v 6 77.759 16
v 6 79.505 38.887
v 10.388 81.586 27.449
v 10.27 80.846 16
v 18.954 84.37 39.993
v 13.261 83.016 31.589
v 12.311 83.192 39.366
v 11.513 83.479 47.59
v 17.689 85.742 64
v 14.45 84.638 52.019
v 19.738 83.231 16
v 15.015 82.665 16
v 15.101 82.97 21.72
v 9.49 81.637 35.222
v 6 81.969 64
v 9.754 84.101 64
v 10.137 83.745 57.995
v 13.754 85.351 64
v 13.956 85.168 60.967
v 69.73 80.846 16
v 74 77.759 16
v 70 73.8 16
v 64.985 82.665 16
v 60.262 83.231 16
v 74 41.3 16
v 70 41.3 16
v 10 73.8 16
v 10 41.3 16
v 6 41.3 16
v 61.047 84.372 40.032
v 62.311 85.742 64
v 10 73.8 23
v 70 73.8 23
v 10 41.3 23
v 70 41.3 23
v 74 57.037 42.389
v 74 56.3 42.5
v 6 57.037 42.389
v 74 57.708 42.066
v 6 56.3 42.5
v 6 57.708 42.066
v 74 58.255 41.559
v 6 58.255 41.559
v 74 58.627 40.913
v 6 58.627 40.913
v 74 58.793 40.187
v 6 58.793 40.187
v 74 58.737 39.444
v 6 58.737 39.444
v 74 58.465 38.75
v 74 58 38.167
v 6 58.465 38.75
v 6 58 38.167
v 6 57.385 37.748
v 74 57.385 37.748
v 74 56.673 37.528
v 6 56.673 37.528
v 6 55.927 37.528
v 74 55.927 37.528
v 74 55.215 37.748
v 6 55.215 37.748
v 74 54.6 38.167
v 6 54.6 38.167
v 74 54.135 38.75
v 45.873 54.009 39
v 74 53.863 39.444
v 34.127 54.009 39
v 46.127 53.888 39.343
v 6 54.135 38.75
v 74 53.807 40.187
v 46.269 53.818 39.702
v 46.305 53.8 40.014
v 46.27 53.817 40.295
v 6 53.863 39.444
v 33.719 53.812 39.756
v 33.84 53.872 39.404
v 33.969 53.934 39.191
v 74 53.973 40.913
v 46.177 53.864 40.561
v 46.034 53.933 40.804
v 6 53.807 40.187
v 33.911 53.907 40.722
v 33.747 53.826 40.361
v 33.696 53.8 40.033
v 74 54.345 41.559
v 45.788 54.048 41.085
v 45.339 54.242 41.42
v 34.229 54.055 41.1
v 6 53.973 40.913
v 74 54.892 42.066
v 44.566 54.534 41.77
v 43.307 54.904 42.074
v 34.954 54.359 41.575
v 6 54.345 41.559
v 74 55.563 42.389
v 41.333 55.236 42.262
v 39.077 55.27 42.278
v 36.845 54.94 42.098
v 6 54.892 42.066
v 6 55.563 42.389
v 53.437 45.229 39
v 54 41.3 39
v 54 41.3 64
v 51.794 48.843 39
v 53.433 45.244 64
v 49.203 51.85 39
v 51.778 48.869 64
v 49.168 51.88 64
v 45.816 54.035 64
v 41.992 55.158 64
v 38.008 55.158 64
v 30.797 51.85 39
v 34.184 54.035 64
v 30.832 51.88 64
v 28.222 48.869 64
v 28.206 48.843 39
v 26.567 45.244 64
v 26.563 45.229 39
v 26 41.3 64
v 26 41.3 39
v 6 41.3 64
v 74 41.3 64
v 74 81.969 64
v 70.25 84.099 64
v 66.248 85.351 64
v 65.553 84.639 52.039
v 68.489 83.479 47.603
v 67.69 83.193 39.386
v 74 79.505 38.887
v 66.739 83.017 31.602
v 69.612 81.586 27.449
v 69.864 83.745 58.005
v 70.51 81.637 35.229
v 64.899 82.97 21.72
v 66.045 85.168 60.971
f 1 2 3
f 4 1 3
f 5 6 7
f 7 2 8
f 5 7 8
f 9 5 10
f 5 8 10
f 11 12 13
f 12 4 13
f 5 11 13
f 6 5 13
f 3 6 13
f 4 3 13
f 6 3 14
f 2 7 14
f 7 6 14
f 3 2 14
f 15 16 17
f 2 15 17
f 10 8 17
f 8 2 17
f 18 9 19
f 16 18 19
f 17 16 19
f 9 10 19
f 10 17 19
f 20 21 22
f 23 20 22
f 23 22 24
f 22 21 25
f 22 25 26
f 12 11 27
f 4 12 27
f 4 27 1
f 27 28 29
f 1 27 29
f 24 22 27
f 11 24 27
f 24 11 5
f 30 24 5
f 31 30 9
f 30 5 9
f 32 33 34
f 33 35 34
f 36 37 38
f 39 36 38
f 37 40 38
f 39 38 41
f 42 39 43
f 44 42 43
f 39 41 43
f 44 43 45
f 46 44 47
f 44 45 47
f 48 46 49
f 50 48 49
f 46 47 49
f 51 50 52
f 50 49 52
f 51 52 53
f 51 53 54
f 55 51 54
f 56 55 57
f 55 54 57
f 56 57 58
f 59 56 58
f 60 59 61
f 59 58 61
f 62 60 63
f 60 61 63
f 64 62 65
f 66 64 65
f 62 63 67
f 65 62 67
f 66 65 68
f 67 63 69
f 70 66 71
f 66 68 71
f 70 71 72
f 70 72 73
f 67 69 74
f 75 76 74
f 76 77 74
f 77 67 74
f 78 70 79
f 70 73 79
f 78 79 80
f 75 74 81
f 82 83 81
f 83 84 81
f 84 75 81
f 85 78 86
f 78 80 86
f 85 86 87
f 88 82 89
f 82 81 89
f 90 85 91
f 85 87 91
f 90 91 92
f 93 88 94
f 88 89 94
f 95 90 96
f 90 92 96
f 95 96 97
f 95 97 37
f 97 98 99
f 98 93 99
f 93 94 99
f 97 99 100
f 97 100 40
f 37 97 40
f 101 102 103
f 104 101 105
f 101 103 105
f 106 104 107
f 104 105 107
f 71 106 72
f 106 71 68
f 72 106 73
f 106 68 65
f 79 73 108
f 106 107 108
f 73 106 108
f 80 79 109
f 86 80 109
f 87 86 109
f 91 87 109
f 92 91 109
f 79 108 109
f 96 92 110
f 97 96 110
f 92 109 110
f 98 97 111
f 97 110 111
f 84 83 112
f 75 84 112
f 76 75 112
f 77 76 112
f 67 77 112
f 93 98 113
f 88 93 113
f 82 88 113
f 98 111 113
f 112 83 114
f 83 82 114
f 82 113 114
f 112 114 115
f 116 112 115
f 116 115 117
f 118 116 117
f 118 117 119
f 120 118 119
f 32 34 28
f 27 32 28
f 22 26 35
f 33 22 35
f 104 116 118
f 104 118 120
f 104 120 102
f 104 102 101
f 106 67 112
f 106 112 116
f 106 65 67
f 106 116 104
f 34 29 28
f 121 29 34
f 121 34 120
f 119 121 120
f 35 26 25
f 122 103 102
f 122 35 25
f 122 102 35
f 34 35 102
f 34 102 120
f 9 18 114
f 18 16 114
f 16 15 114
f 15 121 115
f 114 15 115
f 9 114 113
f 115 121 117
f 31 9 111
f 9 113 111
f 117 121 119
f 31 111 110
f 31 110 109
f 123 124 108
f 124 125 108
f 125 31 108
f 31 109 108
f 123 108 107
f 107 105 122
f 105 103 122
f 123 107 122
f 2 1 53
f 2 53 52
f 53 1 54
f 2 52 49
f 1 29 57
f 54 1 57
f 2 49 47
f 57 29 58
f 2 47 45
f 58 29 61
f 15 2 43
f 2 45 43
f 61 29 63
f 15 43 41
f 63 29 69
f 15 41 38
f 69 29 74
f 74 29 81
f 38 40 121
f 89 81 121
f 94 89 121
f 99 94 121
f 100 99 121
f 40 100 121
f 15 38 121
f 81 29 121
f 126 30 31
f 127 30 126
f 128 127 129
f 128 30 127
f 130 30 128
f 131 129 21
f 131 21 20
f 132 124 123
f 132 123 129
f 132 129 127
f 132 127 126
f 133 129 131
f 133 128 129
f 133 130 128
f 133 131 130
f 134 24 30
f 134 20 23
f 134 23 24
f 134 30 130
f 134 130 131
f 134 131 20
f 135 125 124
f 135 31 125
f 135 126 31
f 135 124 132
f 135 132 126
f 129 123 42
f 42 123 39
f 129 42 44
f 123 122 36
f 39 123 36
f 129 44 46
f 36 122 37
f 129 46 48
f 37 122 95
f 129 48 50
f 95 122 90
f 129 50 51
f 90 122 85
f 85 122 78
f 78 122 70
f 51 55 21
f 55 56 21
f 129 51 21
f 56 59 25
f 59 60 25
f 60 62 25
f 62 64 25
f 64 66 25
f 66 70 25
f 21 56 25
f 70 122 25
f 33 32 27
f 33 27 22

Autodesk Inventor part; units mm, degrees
ref_plane "YZ Plane" through (0, 0, 0) normal (1, 0, 0) x (0, 1, 0)
ref_plane "XZ Plane" through (0, 0, 0) normal (0, 1, 0) x (-1, 0, 0)
ref_plane "XY Plane" through (0, 0, 0) normal (0, 0, 1) x (1, 0, 0)
sketch "Sketch1" plane through (0, 0, 0) normal (0, 0, 1) x (1, 0, 0)
  line L0 (0, 0) -> (80, 0)
  line L1 (80, 0) -> (80, 82.6)
  line L2 (80, 82.6) -> (0, 82.6)
  line L3 (0, 82.6) -> (0, 0)
  dimension "d0" = 80
  dimension "d1" = 82.6
extrude "Extrusion1" add sketch "Sketch1" along normal blind 162.5
sketch "Sketch2" plane through (0, 82.6, 0) normal (0, 1, 0) x (1, 0, 0)
  line L0 (0, -162.5) -> (80, -162.5) projected
  line L1 (-12.5, -162.5) -> (0, -162.5)
  line L2 (80, -162.5) -> (92.5, -162.5)
  line L3 (0, 0) -> (80, 0) projected
  line L4 (0, 0) -> (0, -162.5) projected
  line L5 (80, 0) -> (80, -162.5) projected
  arc A0 (-12.5, -162.5) -> (0, 0) centre (-1199.9534, 10.5733) ccw
  arc A1 (80, 0) -> (92.5, -162.5) centre (1279.9534, 10.5733) ccw
  dimension "d4" = 12.5
  dimension "d5" = 12.5
  dimension "d19" = 1200
  dimension "d20" = 1200
extrude "Extrusion2" add sketch "Sketch2" against normal blind 82.6 contours L1 A0 L4 | L5 A1 L2
sketch "Sketch4" plane through (0, 0, 0) normal (0, 0, -1) x (-1, 0, 0)
  circle A0 centre (-17.4, 59.41) radius 2.5
  circle A1 centre (-62.6, 59.41) radius 2.5
  circle A2 centre (-62.6, 23.19) radius 2.5
  circle A3 centre (-17.4, 23.19) radius 2.5
  line L0 (-80, 82.6) -> (0, 82.6) projected
  line L1 (-17.4, 23.19) -> (-62.6, 23.19) construction
  line L2 (-62.6, 23.19) -> (-62.6, 59.41) construction
  line L3 (-80, 0) -> (-80, 82.6) projected
  point P0 (0, 0)
  point P1 (-60.8187, 82.6)
  point P2 (-19.1813, 82.6)
  point P3 (-40, 23.19)
  point P4 (-40, 82.6)
  dimension "d10" = 5
  dimension "d11" = 5
  dimension "d12" = 5
  dimension "d13" = 5
  dimension "d14" = 23.19
  dimension "d15" = 45.2
  dimension "d16" = 36.22
extrude "Extrusion3" cut sketch "Sketch4" against normal blind 25
sketch "Sketch5" plane through (0, 0, 0) normal (0, 0, -1) x (-1, 0, 0)
  line L0 (12.5, 0) -> (-92.5, 0)
  line L1 (-92.5, 0) -> (-92.5, 41.3)
  line L2 (-92.5, 41.3) -> (12.5, 41.3)
  line L3 (12.5, 41.3) -> (12.5, 0)
  point P0 (0, 0)
  point P1 (12.5, 20)
  point P2 (-92.5, 20)
  dimension "d22" = 41.3
extrude "Extrusion4" cut sketch "Sketch5" against normal through all
sketch "Sketch6" plane through (0, 41.3, 0) normal (0, -1, 0) x (1, 0, 0)
  line L0 (75, 15) -> (5, 15)
  line L1 (5, 15) -> (5, 65)
  line L2 (5, 65) -> (75, 65)
  line L3 (75, 65) -> (75, 15)
  line L4 (80, 0) -> (0, 0) projected
  point P0 (40, 15)
  point P1 (40, 0)
  dimension "d25" = 70
  dimension "d26" = 50
  dimension "d27" = 15
extrude "Extrusion5" cut sketch "Sketch6" against normal blind 32.5
sketch "Sketch8" plane through (0, 0, 0) normal (1, 0, 0) x (0, 1, 0)
  line L0 (82.6, 162.5) -> (93.8, 162.5)
  line L1 (41.3, 162.5) -> (41.3, 0) projected
  line L2 (82.6, 0) -> (41.3, 0) projected
  arc A0 (93.8, 162.5) -> (82.6, 0) centre (2580.9593, -90.5586) ccw
  line L3 (82.6, 162.5) -> (41.3, 162.5) projected
  line L4 (82.6, 162.5) -> (82.6, 0)
  point P0 (0, 0)
  dimension "d32" = 2500
  dimension "d38" = 11.2
extrude "Extrusion6" add sketch "Sketch8" along normal blind 93 and the other way blind 13 contours L0 A0 L4
sketch "Sketch13" plane through (-13, 82.6, 0) normal (0, -1, 0) x (1, 0, 0)
  arc A0 (13, 0) -> (0.5, 162.5) centre (-1186.9534, -10.5733) ccw projected
  line L0 (0, 162.5) -> (0.5, 162.5) projected
  line L1 (0, 0) -> (0, 162.5) projected
  line L2 (13, 0) -> (0, 0) projected
  arc A1 (105.5, 162.5) -> (93, 0) centre (1292.9534, -10.5733) ccw projected
  line L3 (106, 0) -> (93, 0) projected
  line L4 (106, 162.5) -> (106, 0) projected
  line L5 (105.5, 162.5) -> (106, 162.5) projected
  point P0 (13, 0)
extrude "Extrusion9" cut sketch "Sketch13" against normal through all
fillet "Fillet4" radius 20 2 edges at (-3.5176, 86.9111, 81.8462) (83.5176, 86.9111, 81.8462)
sketch "Sketch34" plane through (0, 41.3, 0) normal (0, -1, 0) x (1, 0, 0)
  line L0 (75, 65) -> (75, 15) projected
  line L1 (75, 15) -> (5, 15) projected
  line L2 (5, 15) -> (5, 65) projected
  line L3 (5, 65) -> (75, 65) projected
  arc A0 (0, 0) -> (-12.5, 162.5) centre (-1199.9534, -10.5733) ccw projected
  line L4 (80, 0) -> (0, 0) projected
  arc A1 (92.5, 162.5) -> (80, 0) centre (1279.9534, -10.5733) ccw projected
  line L5 (-12.5, 162.5) -> (92.5, 162.5) projected
  point P0 (0, 0)
extrude "Extrusion24" cut sketch "Sketch34" against normal through all
sketch "Sketch35" plane through (0, 73.8, 0) normal (0, -1, 0) x (1, 0, 0)
  line L0 (75, 15) -> (5, 15) projected
  line L1 (75, 65) -> (75, 15) projected
  line L2 (5, 65) -> (75, 65) projected
  line L3 (5, 15) -> (5, 65) projected
  point P0 (0, 0)
extrude "Extrusion25" add sketch "Sketch35" along normal blind 32.5
sketch "Sketch36" plane through (0, 41.3, 0) normal (0, -1, 0) x (1, 0, 0)
  line L0 (10, 15) -> (70, 15)
  line L1 (70, 15) -> (70, 23)
  line L2 (70, 23) -> (10, 23)
  line L3 (10, 23) -> (10, 15)
  line L4 (5, 15) -> (75, 15) projected
  point P0 (0, 0)
  point P1 (40, 23)
  point P2 (40, 15)
  point P3 (40, 15)
  dimension "d112" = 8
  dimension "d113" = 60
extrude "Extrusion26" cut sketch "Sketch36" against normal blind 32.5
sketch "Sketch37" plane through (5, 41.3, 65) normal (-1, 0, 0) x (0, 0, 1)
  circle A0 centre (-25, 15) radius 2.5
  line L0 (0, 0) -> (-50, 0) projected
  point P0 (-65, -41.3)
  point P1 (-25, 0)
  dimension "d116" = 5
  dimension "d117" = 15
extrude "Extrusion27" cut sketch "Sketch37" against normal through all
sketch "Sketch38" plane through (0, 41.3, 0) normal (0, -1, 0) x (1, 0, 0)
  line L0 (75, 15) -> (5, 15)
  line L1 (5, 15) -> (5, 65)
  line L2 (5, 65) -> (75, 65)
  line L3 (75, 65) -> (75, 15)
  line L4 (75, 65) -> (5, 65) projected
  line L5 (75, 15) -> (75, 65) projected
  line L6 (74, 16) -> (6, 16)
  line L7 (6, 16) -> (6, 64)
  line L8 (6, 64) -> (74, 64)
  line L9 (74, 64) -> (74, 16)
  point P0 (0, 0)
  dimension "d120" = 1
extrude "Extrusion28" cut sketch "Sketch38" against normal through all
sketch "Sketch39" plane through (6, 41.3, 64) normal (0, 0, 1) x (1, 0, 0)
  line L0 (68, 0) -> (0, 0) projected
  line L1 (4, 0) -> (64, 0) projected
  circle A0 centre (34, 0) radius 14
  point P0 (-6, -41.3)
  dimension "d123" = 28
extrude "Extrusion29" cut sketch "Sketch39" against normal blind 25
equation "\"d5\" = d4"
properties part number "AA008" material "ABS Plastic"
